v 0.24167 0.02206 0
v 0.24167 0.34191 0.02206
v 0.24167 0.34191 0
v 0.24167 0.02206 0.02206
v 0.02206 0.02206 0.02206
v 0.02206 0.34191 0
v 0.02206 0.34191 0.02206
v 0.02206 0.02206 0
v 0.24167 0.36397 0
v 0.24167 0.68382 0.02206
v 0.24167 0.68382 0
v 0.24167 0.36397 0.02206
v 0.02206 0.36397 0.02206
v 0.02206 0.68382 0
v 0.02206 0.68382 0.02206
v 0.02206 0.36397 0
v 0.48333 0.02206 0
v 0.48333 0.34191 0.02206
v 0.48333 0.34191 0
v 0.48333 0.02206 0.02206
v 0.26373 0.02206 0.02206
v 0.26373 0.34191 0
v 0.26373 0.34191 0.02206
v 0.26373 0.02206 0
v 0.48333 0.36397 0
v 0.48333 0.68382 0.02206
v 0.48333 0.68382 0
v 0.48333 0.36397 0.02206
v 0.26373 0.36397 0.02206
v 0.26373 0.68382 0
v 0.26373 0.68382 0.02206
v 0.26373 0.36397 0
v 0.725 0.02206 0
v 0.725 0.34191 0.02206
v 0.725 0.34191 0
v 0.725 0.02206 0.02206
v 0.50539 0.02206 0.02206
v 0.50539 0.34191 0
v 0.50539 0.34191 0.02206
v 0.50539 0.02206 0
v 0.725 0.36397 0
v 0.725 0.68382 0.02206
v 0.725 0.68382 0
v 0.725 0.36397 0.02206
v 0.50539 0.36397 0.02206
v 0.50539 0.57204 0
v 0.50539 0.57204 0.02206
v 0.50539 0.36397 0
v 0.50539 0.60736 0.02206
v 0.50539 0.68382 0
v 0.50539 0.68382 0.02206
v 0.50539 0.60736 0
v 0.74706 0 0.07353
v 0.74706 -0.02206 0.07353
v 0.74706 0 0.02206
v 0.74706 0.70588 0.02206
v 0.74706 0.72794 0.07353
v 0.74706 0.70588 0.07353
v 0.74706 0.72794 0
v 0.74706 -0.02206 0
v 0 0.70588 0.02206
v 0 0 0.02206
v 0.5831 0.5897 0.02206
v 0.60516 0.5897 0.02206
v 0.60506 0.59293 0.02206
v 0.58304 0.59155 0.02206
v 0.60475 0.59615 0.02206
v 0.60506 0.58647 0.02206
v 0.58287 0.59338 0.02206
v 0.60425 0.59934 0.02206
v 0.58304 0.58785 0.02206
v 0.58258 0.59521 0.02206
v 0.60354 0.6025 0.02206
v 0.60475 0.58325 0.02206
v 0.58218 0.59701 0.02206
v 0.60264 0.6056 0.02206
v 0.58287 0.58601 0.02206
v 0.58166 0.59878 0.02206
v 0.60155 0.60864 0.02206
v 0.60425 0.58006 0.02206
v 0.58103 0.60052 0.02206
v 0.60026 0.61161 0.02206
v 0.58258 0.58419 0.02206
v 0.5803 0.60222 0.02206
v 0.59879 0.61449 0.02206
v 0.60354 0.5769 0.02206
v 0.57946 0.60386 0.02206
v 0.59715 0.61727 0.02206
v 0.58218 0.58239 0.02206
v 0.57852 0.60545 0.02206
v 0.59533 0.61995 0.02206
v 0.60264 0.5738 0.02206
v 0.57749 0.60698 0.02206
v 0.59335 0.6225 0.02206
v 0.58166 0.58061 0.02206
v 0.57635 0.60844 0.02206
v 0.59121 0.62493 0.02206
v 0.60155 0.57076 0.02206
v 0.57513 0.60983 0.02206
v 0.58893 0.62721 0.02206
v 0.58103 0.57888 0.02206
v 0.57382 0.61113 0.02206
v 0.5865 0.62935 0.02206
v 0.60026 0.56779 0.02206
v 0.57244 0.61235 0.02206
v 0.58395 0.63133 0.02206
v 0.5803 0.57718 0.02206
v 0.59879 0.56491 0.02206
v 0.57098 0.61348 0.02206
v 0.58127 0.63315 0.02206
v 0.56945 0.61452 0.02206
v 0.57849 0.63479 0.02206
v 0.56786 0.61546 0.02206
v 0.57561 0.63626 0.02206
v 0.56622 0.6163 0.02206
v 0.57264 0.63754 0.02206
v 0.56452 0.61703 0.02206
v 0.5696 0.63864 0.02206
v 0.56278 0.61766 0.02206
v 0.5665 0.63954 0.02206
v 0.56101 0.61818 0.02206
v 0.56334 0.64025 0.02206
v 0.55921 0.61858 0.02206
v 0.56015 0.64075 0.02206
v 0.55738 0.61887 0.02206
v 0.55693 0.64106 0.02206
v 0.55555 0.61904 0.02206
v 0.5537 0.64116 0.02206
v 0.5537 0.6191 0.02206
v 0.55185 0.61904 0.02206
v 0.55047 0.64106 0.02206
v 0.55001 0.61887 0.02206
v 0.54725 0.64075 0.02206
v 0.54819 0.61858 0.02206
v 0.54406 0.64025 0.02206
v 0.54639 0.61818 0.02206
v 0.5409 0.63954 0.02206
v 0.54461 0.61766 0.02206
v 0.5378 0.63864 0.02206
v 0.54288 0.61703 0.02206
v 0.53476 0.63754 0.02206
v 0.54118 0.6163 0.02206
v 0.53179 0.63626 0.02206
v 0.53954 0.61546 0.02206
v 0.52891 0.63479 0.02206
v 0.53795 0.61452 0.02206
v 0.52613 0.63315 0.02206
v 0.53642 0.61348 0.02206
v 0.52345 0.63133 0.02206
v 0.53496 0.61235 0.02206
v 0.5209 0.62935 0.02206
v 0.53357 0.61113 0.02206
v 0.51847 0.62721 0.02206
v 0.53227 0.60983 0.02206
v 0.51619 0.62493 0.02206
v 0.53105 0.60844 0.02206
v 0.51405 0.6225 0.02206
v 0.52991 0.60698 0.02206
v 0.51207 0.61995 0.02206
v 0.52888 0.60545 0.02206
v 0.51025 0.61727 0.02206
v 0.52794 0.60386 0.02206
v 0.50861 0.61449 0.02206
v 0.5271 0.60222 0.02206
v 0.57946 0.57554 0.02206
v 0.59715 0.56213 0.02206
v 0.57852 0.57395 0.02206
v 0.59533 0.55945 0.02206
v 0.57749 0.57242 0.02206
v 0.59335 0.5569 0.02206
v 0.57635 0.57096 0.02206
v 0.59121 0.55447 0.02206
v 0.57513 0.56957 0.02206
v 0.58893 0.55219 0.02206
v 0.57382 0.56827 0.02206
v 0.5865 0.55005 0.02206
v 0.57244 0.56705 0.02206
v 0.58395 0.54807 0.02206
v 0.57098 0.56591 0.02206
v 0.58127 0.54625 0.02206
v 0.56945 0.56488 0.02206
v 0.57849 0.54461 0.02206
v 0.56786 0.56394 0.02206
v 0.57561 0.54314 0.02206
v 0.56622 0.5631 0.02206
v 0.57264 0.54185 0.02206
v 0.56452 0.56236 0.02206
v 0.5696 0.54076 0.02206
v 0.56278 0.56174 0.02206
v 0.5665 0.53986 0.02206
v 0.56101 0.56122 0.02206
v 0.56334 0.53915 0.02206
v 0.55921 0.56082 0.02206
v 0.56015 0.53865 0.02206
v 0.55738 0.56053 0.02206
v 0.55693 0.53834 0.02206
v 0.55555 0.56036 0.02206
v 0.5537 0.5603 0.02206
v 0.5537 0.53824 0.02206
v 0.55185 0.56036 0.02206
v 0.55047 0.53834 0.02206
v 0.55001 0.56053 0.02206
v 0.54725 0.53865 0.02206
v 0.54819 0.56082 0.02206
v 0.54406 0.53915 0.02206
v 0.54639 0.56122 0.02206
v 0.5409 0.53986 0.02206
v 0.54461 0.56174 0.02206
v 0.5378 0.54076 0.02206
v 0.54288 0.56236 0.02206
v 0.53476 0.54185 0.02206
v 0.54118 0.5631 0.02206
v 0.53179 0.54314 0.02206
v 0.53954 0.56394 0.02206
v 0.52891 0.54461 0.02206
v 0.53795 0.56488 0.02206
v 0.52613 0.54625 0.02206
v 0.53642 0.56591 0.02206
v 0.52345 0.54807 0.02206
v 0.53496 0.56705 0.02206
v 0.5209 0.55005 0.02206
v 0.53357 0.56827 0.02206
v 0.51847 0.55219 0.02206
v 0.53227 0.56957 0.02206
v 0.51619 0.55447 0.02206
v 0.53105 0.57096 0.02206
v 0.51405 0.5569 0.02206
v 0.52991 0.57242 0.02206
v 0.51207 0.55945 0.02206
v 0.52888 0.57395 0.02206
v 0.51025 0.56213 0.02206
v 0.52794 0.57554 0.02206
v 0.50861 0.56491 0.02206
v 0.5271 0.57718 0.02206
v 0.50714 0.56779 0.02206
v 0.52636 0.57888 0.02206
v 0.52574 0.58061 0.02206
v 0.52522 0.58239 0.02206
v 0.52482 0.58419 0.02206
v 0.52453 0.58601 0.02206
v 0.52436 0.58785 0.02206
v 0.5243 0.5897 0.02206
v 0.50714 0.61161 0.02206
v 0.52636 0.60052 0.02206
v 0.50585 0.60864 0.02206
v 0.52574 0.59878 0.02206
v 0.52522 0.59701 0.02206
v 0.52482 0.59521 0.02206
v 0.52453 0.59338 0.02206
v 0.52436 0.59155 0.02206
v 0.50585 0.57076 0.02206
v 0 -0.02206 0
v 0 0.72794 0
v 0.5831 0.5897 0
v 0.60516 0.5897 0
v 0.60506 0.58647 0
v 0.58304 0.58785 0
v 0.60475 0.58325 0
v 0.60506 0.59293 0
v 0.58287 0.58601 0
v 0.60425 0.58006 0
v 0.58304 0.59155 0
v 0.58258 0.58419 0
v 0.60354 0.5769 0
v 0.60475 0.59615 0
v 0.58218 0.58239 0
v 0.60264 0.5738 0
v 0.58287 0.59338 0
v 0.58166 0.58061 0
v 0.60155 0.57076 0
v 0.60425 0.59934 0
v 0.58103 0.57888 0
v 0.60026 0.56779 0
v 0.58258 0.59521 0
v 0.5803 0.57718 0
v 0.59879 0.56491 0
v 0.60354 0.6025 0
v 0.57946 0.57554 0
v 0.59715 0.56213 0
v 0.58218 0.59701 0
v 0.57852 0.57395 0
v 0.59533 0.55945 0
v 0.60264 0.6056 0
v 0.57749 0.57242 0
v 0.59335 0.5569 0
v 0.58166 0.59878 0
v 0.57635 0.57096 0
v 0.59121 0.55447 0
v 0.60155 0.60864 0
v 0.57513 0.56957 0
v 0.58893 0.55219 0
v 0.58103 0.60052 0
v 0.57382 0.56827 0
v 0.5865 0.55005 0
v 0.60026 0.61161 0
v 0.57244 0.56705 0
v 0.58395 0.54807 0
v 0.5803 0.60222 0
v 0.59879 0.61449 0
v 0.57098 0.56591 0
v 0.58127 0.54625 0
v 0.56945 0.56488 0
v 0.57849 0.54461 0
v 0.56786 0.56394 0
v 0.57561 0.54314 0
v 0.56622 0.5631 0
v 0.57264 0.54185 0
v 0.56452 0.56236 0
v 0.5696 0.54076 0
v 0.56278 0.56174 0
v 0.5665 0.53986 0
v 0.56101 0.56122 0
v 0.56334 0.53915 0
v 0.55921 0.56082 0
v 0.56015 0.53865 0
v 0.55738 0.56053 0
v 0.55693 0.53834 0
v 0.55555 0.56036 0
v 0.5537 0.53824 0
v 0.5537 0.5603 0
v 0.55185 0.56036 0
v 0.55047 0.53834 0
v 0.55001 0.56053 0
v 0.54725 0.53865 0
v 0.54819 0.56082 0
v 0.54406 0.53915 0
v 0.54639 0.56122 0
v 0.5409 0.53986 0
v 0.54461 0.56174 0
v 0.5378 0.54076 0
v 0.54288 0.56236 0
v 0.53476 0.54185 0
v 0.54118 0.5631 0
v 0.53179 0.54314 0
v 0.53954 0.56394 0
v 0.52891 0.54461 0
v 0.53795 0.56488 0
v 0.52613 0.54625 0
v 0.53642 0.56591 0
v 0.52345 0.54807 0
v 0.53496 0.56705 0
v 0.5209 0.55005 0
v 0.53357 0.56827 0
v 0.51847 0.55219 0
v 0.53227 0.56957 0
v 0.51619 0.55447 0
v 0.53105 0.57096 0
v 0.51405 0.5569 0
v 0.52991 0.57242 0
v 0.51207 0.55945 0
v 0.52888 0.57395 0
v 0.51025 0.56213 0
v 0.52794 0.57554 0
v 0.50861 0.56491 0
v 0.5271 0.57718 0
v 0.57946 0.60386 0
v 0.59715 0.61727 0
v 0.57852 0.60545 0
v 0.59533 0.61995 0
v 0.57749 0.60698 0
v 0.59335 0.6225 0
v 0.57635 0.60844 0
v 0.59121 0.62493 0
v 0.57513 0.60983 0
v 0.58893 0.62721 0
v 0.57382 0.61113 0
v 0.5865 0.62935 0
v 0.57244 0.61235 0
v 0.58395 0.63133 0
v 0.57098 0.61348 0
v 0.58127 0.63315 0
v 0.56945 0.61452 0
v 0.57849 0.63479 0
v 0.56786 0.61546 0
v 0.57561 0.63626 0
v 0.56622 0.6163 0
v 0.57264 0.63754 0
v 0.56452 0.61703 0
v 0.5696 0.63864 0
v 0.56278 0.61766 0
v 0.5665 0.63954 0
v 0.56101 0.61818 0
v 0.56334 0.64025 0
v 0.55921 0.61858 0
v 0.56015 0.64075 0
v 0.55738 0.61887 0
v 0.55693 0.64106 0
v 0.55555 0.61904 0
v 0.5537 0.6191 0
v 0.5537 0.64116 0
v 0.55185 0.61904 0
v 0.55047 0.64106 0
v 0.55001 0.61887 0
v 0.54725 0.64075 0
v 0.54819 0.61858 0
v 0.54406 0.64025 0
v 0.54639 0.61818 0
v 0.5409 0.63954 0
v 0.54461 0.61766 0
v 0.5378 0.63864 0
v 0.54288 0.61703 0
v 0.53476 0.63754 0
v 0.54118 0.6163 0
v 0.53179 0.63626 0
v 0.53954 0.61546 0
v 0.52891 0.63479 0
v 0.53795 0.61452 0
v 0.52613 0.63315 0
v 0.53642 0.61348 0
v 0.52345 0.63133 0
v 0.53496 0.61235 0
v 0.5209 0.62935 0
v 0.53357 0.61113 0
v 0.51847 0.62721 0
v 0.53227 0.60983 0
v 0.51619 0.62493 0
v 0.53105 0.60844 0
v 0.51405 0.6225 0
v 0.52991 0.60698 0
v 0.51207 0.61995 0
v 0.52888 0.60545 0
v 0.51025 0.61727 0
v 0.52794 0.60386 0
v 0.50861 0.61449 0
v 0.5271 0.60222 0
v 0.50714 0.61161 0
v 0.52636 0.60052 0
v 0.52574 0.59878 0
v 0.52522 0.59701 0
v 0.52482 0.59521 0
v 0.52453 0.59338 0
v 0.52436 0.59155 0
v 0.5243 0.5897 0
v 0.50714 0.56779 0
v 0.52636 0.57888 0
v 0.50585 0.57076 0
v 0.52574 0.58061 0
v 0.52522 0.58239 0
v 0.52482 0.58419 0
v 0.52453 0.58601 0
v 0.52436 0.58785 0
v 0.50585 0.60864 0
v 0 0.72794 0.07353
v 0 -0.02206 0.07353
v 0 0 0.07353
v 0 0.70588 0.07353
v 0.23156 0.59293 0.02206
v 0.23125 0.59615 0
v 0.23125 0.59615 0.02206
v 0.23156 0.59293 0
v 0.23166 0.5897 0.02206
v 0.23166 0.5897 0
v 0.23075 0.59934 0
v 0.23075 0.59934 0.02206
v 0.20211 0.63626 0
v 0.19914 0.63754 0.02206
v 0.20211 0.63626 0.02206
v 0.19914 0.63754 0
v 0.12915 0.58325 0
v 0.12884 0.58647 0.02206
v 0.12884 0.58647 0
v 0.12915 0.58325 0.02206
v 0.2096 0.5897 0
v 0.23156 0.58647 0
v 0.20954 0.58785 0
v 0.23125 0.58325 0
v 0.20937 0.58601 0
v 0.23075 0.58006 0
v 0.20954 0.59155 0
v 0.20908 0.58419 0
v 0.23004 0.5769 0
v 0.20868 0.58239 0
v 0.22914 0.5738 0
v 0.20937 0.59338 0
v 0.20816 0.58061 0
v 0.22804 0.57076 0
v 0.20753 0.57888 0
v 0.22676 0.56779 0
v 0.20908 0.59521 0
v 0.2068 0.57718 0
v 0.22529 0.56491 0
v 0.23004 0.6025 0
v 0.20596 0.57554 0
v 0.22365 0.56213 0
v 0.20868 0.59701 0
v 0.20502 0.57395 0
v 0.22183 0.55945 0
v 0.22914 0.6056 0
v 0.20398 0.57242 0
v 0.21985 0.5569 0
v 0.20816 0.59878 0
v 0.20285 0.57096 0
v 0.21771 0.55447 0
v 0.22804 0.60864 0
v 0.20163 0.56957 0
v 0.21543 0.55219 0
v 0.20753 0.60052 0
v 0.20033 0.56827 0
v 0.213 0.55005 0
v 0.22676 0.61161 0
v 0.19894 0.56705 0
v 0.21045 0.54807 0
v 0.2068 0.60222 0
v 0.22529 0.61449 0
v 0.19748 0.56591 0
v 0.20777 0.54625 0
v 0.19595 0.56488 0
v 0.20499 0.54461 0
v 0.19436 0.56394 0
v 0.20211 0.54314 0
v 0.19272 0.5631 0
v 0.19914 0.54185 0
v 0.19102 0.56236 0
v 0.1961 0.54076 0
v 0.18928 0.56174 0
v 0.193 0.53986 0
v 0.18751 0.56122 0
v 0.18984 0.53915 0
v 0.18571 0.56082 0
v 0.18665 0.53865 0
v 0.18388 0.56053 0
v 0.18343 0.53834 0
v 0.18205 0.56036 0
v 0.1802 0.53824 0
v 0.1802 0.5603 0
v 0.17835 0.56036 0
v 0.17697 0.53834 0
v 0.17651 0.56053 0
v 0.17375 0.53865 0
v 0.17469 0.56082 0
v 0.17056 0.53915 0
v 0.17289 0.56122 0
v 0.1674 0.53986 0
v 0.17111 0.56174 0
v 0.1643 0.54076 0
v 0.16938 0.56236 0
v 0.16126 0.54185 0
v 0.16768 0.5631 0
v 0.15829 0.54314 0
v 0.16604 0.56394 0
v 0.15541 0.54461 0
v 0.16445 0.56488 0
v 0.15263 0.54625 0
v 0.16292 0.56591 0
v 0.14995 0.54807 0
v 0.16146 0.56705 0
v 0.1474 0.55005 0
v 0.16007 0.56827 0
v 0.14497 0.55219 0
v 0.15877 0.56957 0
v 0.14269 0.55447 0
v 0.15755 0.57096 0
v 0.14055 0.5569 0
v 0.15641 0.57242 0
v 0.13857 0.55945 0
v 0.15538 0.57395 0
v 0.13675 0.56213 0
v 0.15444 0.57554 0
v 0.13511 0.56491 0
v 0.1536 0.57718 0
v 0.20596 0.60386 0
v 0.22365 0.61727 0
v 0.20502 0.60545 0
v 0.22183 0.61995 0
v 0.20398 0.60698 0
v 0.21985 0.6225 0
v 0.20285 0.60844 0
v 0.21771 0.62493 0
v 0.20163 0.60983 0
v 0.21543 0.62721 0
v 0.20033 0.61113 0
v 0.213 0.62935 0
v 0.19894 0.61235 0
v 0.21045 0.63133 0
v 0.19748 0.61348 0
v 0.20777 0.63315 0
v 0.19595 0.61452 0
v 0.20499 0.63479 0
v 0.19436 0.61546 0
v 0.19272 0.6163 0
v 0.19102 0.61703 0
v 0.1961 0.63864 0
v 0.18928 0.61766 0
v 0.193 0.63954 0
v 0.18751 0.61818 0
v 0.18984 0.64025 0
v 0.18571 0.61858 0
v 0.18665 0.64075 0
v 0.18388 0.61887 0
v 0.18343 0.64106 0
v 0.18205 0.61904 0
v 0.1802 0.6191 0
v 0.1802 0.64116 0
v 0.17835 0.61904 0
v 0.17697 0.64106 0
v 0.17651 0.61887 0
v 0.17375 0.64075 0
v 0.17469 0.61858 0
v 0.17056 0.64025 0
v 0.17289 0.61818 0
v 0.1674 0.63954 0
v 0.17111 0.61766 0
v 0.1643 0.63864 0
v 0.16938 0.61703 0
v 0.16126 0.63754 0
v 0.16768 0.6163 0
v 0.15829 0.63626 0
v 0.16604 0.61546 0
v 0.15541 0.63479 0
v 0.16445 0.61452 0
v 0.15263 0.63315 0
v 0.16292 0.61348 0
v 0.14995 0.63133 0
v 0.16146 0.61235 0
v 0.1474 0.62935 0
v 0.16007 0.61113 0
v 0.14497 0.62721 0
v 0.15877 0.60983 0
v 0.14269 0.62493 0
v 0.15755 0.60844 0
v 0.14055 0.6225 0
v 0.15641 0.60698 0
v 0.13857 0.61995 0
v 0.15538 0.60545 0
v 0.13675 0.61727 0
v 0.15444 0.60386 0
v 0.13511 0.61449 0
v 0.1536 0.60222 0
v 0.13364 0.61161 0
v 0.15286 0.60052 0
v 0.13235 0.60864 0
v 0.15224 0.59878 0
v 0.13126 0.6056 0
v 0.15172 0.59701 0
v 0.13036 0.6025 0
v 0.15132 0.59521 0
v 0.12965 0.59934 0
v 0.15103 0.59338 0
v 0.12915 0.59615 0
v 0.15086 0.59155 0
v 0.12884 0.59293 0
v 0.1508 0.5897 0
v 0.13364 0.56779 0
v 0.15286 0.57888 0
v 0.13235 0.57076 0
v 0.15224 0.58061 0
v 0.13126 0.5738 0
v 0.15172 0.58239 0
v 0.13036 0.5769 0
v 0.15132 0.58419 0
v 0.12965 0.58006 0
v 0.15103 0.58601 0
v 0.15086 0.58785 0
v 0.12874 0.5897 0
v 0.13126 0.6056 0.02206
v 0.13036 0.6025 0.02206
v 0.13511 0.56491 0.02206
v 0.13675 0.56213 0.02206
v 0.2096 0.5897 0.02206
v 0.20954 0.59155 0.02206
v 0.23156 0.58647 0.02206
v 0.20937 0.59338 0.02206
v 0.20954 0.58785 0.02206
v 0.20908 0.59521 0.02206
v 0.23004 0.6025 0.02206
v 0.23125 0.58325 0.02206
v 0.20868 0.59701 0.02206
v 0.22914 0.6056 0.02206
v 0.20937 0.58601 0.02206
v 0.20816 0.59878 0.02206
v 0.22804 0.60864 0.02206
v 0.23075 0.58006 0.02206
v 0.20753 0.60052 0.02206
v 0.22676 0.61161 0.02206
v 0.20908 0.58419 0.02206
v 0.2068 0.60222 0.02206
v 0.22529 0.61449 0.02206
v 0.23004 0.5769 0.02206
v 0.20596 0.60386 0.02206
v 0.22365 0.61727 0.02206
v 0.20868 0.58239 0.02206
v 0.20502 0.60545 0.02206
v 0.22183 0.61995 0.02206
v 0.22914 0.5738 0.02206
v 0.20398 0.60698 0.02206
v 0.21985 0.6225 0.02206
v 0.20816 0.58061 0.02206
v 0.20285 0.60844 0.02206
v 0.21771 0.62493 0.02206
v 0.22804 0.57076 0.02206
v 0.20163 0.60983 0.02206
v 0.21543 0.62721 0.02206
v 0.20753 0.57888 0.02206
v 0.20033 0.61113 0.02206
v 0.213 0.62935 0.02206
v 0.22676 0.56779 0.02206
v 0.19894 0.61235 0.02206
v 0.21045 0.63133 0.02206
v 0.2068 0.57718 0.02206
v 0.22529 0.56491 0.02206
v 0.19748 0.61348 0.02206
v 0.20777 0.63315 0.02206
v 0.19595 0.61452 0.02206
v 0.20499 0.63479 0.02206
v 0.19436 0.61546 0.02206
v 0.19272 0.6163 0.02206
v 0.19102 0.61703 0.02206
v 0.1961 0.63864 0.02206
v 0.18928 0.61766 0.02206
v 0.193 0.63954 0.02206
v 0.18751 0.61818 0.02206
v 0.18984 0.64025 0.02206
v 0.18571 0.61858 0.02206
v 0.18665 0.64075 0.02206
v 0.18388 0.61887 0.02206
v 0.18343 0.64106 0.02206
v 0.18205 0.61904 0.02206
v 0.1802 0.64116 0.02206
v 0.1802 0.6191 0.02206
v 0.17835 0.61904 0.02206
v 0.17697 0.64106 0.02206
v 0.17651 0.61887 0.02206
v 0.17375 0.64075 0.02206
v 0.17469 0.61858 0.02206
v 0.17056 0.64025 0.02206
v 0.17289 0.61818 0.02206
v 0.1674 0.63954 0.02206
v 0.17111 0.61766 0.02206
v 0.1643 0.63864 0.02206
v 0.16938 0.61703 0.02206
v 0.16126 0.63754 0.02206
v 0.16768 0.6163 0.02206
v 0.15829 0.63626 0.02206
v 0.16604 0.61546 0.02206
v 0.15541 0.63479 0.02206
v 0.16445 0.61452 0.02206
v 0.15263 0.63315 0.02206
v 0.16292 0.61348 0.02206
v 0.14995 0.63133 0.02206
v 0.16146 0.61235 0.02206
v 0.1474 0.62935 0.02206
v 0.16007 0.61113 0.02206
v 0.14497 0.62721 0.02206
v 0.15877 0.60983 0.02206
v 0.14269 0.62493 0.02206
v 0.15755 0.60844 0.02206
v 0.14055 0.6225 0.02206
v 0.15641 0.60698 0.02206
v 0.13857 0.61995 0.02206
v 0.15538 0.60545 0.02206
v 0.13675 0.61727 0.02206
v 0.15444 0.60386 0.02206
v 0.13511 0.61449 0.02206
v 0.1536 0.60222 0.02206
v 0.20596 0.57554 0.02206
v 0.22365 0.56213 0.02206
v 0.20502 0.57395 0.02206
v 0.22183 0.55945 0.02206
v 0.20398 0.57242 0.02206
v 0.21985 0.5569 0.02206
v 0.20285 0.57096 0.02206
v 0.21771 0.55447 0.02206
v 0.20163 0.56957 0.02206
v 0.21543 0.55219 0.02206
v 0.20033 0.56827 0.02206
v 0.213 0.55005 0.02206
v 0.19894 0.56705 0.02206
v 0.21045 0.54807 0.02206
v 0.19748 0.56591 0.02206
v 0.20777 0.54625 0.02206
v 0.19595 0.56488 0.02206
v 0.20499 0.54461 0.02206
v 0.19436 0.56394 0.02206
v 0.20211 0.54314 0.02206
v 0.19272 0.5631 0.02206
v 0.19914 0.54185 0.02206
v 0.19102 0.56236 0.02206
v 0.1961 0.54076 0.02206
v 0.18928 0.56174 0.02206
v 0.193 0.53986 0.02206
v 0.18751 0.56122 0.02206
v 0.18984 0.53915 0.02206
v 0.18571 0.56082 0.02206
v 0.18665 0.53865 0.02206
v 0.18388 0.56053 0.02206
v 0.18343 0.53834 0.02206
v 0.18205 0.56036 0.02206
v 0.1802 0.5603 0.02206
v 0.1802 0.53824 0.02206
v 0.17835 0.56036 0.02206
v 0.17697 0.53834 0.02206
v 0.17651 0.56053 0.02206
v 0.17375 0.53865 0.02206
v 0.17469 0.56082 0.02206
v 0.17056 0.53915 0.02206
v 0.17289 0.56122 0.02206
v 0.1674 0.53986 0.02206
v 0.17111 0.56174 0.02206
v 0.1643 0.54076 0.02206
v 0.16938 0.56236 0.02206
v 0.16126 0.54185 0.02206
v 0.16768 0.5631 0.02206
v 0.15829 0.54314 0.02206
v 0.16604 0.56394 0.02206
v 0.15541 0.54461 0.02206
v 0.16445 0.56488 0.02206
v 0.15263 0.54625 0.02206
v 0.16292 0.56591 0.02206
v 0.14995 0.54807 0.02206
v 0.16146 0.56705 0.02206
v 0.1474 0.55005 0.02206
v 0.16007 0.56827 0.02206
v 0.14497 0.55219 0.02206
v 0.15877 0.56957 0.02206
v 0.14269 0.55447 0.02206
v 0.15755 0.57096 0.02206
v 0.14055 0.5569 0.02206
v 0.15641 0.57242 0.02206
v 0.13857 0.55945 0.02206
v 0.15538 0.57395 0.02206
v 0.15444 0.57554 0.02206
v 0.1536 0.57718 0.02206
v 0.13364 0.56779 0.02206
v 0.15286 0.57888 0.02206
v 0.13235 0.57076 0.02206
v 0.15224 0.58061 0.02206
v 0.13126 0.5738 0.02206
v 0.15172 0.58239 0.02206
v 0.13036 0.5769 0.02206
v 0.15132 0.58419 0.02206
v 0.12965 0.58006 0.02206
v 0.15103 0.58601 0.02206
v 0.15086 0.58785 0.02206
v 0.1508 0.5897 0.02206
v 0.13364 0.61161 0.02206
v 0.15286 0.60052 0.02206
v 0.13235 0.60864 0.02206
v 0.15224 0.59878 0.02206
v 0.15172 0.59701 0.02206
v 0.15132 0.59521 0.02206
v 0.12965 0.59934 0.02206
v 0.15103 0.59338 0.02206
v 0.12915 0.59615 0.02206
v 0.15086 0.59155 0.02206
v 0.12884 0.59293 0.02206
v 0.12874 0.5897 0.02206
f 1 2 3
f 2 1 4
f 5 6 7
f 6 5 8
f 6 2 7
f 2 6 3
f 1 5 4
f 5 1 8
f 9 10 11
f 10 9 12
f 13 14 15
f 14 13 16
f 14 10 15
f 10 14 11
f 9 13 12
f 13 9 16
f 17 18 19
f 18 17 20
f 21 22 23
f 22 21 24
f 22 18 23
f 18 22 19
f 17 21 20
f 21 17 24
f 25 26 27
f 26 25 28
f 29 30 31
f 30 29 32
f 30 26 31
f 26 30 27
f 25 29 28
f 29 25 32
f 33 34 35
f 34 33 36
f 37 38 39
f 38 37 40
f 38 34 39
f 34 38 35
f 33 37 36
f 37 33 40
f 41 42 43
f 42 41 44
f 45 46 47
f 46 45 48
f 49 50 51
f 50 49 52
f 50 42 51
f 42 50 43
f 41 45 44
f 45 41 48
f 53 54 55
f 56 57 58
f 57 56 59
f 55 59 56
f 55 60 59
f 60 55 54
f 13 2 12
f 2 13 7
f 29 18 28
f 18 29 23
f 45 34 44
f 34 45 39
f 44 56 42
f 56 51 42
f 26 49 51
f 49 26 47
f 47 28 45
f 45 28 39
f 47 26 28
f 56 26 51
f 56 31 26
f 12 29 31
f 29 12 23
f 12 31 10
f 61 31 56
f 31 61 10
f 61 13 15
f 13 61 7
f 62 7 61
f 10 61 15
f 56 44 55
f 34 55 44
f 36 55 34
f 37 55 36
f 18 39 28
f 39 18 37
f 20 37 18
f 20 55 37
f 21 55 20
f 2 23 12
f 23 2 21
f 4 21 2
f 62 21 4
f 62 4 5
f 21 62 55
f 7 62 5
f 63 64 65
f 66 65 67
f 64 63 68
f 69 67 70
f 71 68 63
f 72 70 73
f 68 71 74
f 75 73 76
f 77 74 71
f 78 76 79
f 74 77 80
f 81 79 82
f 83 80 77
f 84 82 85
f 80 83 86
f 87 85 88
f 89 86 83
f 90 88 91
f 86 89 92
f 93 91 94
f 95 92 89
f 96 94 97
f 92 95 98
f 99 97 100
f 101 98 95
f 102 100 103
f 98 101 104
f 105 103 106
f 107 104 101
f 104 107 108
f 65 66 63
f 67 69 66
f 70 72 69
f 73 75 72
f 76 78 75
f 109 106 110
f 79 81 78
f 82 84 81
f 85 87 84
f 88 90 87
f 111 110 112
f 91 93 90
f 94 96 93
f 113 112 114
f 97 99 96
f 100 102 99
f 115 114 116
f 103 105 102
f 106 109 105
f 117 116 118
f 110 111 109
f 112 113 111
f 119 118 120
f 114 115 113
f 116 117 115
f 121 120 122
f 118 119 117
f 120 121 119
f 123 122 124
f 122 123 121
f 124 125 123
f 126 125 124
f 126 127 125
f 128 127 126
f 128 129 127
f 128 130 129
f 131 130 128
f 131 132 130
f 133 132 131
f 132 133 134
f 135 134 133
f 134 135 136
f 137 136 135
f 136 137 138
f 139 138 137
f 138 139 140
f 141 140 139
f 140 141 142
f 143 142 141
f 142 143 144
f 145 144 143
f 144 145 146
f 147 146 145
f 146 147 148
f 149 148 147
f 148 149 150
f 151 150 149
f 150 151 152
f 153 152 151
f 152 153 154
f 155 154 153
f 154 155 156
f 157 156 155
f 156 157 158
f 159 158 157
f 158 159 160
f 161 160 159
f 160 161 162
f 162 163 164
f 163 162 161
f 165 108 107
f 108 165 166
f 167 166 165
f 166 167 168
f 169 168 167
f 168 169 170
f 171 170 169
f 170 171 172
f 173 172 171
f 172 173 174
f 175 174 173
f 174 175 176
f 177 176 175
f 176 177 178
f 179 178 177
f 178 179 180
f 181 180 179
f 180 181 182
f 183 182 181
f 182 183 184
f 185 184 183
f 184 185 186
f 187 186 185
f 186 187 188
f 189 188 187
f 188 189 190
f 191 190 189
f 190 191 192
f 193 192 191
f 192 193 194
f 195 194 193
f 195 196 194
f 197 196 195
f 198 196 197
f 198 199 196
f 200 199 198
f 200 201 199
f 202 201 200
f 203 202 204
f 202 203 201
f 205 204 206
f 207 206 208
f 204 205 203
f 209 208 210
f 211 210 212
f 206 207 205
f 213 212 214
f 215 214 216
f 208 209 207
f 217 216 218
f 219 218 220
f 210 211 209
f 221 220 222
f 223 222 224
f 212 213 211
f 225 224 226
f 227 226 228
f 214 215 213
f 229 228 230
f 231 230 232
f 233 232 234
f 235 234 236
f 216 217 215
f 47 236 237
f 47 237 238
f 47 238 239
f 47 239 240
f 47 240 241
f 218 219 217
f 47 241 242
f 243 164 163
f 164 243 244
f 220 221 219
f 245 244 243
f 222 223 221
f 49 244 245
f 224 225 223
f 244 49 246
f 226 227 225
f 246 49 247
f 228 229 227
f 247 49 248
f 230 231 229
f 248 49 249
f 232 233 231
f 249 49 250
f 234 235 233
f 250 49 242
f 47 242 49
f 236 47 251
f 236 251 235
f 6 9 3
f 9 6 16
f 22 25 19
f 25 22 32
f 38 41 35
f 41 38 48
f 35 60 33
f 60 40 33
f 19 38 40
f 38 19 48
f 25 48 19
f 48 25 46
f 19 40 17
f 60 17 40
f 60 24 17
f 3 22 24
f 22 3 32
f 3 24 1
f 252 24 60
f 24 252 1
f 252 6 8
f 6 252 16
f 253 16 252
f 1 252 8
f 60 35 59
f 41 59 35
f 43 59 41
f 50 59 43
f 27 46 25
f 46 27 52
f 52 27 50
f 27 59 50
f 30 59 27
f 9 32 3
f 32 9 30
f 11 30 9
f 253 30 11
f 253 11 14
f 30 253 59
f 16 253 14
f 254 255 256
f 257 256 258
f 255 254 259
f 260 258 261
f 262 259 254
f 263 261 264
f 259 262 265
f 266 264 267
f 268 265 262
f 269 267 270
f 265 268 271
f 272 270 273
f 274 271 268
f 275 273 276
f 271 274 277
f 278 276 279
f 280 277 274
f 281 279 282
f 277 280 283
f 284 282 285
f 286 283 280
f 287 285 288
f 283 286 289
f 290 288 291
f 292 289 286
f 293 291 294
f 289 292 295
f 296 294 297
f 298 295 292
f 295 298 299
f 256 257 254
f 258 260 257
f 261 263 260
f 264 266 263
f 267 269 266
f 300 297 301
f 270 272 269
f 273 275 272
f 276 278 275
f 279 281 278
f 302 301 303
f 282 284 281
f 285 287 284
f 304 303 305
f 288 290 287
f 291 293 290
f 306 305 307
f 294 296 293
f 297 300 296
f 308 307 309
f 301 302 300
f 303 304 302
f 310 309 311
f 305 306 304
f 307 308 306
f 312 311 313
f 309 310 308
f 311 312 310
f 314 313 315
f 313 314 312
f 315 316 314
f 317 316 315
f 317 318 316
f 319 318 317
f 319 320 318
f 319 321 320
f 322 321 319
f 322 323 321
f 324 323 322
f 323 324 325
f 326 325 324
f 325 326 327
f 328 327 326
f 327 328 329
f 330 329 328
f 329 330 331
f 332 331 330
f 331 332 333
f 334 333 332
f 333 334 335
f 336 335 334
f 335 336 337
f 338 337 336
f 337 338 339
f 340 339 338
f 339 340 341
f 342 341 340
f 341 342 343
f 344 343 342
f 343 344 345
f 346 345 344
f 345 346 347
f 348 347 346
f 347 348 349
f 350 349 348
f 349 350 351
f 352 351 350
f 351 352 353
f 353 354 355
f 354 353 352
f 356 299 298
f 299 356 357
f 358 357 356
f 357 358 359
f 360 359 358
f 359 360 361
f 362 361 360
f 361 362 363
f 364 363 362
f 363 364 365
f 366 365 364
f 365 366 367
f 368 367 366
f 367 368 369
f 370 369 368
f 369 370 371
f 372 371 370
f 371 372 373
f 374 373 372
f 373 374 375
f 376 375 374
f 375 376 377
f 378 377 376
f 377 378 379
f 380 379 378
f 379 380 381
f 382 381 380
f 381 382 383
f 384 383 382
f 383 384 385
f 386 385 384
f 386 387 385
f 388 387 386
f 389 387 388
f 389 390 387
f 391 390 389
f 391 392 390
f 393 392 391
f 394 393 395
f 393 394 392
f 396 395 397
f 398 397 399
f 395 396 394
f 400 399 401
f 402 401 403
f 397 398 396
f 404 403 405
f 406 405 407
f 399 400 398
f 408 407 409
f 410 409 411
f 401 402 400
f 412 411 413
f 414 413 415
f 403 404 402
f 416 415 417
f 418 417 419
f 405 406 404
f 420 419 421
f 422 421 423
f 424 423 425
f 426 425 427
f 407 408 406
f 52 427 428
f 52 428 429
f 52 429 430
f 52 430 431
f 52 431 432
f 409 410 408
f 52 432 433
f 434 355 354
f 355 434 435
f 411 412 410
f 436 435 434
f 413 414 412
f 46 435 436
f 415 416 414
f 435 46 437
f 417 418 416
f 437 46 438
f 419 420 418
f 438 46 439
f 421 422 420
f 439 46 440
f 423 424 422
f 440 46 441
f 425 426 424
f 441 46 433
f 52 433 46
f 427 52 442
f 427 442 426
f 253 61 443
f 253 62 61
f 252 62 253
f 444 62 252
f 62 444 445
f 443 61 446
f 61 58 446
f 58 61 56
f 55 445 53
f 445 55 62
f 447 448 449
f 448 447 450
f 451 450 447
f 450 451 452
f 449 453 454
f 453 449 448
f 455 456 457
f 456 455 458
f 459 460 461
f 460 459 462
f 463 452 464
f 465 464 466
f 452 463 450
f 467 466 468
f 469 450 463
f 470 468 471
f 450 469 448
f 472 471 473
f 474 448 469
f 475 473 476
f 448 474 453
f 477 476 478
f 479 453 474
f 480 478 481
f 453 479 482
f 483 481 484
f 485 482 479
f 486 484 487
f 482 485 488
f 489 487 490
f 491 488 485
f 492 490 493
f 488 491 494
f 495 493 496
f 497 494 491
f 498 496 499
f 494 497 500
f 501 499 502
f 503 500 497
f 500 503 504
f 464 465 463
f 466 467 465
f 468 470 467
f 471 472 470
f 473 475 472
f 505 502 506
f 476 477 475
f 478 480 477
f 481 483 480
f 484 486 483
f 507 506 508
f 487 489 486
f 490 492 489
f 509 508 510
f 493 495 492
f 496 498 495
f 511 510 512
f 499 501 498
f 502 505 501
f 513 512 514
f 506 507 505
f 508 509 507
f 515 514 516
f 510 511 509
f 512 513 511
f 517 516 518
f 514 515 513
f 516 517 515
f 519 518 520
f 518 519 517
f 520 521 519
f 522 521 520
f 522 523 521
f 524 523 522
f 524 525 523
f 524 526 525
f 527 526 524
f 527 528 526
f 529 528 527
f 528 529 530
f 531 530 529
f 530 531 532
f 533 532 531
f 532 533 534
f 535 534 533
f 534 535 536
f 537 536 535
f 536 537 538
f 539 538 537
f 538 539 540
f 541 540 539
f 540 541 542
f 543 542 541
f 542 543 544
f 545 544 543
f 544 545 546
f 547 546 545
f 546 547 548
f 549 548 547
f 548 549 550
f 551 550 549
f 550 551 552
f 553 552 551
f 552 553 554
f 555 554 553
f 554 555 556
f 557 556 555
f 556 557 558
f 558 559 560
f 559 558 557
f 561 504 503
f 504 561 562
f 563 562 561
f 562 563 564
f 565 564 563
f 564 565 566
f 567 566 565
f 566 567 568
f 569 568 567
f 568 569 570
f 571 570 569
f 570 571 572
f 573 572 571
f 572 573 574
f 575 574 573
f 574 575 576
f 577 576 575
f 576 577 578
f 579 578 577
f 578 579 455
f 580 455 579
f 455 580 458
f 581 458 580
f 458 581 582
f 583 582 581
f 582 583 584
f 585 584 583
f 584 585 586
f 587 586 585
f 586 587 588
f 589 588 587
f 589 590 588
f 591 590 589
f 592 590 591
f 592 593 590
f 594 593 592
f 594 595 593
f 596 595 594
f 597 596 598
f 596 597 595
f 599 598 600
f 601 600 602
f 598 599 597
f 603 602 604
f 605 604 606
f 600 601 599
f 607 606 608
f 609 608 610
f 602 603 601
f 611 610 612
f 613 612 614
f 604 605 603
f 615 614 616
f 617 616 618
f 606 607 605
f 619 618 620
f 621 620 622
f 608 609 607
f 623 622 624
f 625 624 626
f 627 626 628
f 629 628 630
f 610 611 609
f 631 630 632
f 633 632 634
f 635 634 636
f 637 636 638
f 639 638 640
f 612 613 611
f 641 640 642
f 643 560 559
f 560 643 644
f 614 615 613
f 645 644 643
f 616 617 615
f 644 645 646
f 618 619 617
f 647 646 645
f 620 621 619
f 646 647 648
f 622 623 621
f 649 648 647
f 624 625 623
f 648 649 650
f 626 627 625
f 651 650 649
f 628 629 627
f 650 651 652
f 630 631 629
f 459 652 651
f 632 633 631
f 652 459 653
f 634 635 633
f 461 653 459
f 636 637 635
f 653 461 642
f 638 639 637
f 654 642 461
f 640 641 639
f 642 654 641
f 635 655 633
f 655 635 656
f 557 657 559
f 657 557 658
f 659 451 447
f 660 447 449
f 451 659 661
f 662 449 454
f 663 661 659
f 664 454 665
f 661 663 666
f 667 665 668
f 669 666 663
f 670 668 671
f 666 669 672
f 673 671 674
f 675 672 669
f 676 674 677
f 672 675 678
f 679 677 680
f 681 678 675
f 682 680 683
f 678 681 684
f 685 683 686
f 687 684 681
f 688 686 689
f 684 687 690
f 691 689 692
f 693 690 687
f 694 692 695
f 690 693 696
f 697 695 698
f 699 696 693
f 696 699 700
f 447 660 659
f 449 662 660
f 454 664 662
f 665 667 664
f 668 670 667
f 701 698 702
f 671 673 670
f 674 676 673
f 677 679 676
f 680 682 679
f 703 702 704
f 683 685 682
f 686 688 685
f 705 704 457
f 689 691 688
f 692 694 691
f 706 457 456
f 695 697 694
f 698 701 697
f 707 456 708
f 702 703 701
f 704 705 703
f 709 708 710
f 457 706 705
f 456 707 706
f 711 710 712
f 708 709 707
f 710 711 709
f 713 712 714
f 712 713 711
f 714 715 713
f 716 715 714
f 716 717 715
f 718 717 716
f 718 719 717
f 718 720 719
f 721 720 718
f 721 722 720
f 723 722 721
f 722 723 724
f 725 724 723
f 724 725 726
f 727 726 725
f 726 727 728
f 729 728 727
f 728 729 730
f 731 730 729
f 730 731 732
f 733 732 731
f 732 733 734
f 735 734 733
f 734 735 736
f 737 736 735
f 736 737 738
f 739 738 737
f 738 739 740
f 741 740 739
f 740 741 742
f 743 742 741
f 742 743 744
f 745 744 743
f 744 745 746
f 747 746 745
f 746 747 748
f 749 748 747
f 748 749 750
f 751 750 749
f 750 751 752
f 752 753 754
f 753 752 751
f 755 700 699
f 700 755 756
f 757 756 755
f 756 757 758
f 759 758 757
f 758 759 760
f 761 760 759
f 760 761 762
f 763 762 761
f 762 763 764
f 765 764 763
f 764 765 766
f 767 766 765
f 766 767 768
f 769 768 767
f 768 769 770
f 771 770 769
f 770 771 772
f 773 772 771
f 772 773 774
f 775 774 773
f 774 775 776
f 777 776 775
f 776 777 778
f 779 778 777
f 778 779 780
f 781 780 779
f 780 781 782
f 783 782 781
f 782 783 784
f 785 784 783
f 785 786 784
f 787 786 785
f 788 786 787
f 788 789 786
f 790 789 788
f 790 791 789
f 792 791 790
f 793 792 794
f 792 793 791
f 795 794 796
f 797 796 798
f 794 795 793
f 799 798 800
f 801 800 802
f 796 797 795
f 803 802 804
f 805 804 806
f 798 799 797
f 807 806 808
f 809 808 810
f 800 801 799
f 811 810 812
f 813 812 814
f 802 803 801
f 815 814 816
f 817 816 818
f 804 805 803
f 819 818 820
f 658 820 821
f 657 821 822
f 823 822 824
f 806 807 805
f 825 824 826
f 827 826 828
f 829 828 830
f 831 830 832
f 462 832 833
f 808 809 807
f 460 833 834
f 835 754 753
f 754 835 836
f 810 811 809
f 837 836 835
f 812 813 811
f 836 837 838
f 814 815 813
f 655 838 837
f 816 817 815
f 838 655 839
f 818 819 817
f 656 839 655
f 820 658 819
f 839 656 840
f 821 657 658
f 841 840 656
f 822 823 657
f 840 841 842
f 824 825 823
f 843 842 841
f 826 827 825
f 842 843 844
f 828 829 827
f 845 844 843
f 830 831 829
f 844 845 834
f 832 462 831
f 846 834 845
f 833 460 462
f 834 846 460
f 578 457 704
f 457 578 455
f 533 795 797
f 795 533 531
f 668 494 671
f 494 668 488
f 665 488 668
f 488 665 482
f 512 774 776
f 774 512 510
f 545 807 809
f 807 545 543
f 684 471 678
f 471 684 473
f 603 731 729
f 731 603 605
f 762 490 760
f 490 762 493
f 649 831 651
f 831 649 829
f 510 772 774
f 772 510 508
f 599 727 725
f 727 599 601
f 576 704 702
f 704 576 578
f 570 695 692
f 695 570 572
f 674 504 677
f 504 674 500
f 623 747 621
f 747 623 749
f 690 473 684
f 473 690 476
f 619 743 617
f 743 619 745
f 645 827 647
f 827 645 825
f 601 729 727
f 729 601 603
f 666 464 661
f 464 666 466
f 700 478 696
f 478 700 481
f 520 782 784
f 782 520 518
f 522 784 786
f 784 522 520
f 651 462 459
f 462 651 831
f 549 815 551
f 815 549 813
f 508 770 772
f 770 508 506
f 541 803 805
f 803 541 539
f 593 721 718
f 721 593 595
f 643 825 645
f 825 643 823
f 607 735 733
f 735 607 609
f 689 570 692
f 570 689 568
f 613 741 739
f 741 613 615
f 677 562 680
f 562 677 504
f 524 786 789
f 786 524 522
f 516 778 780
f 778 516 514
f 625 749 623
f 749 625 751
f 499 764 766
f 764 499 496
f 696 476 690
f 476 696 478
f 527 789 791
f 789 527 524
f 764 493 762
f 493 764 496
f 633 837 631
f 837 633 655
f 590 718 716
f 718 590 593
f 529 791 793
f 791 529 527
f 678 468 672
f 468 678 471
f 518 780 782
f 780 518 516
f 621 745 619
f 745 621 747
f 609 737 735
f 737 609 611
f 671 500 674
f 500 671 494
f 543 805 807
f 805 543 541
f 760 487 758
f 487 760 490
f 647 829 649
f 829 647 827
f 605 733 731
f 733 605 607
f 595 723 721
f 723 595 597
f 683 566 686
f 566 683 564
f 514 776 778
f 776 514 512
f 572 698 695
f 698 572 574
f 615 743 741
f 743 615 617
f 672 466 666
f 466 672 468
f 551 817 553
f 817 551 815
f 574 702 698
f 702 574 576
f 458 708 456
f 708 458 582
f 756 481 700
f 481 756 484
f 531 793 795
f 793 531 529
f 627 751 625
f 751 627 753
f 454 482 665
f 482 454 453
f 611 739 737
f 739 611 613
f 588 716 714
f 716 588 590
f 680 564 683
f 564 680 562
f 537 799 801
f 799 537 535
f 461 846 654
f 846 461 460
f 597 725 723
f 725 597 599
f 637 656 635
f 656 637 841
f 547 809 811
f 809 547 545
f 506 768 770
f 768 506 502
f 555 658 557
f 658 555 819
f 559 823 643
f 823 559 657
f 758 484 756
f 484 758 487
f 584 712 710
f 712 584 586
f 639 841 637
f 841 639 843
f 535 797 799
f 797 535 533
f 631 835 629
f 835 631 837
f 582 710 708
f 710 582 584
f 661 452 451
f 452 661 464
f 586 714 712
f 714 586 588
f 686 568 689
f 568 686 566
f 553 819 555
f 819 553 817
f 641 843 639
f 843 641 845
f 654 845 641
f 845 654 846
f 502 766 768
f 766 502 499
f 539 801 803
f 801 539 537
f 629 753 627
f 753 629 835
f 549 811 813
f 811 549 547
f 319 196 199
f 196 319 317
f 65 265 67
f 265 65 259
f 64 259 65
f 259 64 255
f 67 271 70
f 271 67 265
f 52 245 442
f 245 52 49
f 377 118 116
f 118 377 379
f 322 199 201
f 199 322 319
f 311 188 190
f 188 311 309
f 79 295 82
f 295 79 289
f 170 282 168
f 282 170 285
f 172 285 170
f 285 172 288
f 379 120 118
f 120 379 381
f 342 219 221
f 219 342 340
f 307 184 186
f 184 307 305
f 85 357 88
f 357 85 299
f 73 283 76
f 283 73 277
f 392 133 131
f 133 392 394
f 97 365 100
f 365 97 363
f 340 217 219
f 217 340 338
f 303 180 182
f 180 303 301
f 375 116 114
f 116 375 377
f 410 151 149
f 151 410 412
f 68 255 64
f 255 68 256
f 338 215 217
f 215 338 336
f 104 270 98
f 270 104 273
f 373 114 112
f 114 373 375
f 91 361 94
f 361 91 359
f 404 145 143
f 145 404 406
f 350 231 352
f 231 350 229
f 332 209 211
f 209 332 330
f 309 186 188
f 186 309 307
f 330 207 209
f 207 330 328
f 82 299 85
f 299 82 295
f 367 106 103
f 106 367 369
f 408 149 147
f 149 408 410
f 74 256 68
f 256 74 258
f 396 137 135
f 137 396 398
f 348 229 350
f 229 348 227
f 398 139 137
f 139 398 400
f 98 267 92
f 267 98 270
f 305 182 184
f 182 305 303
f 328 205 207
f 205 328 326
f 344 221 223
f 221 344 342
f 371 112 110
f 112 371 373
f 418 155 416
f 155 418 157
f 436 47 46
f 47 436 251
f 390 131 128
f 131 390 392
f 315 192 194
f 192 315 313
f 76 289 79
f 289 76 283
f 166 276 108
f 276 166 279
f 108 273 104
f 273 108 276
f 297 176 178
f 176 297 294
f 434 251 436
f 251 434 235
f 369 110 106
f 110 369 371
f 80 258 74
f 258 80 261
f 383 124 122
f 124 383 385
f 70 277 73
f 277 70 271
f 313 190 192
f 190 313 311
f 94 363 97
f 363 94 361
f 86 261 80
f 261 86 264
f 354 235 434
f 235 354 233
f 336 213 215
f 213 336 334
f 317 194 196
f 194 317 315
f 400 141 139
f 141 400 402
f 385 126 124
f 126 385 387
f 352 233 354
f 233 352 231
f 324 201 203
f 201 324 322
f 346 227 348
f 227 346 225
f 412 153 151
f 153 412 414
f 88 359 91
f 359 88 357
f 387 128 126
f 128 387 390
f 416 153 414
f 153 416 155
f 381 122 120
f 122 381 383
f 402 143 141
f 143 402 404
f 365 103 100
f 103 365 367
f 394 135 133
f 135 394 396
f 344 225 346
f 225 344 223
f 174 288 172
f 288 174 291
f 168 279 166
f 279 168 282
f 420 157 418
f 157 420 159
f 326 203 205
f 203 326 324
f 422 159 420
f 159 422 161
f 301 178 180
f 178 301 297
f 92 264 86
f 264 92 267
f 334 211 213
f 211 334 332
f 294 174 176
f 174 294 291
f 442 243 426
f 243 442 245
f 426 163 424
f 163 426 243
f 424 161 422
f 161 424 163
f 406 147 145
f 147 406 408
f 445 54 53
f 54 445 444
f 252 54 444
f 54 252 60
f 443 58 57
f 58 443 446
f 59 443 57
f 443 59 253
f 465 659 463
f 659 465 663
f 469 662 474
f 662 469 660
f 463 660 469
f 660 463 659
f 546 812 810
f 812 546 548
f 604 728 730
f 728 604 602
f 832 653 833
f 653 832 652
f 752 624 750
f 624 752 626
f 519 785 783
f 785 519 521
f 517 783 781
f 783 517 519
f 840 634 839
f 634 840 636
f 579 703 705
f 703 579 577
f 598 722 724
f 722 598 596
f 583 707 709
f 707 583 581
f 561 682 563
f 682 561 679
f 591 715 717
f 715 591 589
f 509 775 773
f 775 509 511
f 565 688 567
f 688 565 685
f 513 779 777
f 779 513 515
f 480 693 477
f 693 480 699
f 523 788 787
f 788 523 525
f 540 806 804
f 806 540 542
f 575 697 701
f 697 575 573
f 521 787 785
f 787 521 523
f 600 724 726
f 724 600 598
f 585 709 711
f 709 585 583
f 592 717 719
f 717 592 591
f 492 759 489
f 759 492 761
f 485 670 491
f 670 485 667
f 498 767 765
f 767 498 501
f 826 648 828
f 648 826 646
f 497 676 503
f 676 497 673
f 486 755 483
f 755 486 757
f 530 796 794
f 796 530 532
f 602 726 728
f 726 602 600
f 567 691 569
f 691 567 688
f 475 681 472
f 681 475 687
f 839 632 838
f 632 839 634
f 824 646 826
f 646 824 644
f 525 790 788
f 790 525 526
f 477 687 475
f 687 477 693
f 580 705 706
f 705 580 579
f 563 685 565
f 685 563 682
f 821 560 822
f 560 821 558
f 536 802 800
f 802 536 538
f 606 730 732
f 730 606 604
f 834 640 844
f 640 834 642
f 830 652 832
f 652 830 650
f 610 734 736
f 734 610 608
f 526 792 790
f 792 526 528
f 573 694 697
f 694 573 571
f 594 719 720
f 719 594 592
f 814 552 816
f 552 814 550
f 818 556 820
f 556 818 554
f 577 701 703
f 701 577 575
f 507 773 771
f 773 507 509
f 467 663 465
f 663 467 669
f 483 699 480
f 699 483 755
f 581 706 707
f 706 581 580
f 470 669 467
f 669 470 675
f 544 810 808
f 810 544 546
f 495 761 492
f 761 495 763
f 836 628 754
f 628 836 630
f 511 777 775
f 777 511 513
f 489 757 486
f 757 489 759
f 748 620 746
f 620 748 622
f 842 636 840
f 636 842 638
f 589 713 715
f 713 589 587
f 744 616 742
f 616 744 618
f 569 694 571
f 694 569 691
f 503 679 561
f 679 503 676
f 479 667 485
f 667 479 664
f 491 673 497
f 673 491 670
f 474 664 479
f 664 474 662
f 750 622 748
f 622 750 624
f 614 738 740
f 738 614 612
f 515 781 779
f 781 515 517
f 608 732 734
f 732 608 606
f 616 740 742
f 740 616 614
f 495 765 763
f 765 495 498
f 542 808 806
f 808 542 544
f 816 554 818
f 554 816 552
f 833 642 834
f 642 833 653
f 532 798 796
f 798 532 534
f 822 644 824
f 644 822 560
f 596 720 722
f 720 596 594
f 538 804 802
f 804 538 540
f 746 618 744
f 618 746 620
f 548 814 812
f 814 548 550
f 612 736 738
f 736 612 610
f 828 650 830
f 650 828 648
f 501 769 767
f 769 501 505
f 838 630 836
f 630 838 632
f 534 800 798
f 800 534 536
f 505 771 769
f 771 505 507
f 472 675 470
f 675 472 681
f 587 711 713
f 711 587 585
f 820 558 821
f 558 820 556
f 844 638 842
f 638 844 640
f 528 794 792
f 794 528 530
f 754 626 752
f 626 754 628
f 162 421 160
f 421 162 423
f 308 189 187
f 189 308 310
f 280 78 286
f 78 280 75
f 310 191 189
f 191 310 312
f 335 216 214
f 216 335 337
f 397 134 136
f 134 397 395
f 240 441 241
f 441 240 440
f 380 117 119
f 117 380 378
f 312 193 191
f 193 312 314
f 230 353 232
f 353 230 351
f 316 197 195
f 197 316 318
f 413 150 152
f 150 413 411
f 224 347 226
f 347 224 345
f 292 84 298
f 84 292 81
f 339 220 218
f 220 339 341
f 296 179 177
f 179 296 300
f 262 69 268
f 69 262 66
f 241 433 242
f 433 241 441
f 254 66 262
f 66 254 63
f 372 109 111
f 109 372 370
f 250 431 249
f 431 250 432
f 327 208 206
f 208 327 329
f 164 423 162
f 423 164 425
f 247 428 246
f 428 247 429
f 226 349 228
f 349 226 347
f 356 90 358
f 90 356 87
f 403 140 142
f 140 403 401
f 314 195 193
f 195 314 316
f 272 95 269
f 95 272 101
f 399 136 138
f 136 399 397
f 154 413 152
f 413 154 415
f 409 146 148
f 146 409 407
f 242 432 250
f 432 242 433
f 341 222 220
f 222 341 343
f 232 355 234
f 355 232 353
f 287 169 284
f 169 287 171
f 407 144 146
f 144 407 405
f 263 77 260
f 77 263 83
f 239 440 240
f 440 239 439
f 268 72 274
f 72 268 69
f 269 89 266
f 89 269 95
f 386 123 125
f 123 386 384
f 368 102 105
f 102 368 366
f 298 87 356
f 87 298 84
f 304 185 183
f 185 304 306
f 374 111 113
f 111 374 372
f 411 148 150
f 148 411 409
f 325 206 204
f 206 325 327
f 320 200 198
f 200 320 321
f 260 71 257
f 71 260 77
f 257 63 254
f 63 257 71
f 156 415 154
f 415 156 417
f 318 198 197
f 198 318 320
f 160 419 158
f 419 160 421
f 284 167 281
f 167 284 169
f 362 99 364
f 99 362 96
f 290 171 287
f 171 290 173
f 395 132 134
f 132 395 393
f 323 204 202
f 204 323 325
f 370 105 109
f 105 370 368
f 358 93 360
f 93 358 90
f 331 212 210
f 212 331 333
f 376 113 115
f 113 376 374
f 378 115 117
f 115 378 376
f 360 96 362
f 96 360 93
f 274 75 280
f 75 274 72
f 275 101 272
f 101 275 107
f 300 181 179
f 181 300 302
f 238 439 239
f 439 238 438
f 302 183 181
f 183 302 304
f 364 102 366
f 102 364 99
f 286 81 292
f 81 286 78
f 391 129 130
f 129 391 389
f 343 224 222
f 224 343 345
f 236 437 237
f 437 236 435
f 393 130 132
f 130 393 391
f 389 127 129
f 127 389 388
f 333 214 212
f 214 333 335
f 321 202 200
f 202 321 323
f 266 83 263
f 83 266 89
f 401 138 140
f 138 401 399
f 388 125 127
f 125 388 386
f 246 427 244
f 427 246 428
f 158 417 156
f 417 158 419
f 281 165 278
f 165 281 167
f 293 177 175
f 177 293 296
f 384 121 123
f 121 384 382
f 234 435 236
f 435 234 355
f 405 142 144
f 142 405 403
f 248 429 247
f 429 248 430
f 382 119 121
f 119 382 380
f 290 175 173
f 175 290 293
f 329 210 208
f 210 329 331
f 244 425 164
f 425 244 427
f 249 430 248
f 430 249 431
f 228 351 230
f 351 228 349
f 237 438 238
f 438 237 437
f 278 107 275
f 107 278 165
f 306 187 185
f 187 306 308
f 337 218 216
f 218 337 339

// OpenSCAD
// ==========================================
// Parametric CAD Model
// ==========================================

// Resolution for circular features
$fn = 100;

// Base Dimensions
base_length = 0.747059;
base_width = 0.705882;
base_thickness = 0.022059;

// Wall and Rib Dimensions
wall_thickness = 0.022059;
wall_height = 0.073529;

// Circular Openings (Holes)
hole_radius = 0.0294;
hole1_x = 0.1802;
hole1_y = 0.5897;
hole2_x = 0.5537;
hole2_y = 0.5897;

// Epsilon for clean boolean operations
eps = 0.002;

// ==========================================
// Module Definitions
// ==========================================

// Module for the main solid structure before hole subtraction
module solid_structure() {
    union() {
        // 1. Base Web Structure
        difference() {
            // Main solid base footprint
            cube([base_length, base_width, base_thickness]);
            
            // Subtract 6 inner void outlines to create the open web
            // Arranged in a 3x2 grid (3 columns in X, 2 rows in Y)
            let(
                void_w = (base_length - 4 * wall_thickness) / 3,
                void_d = (base_width - 3 * wall_thickness) / 2
            ) {
                for (i = [0:2]) {
                    for (j = [0:1]) {
                        translate([
                            wall_thickness + i * (void_w + wall_thickness),
                            wall_thickness + j * (void_d + wall_thickness),
                            -eps/2
                        ])
                        cube([void_w, void_d, base_thickness + eps]);
                    }
                }
            }
        }
        
        // 2. Bosses for the circular openings
        // Ensures material exists around the holes within the open web
        let(boss_radius = hole_radius + wall_thickness) {
            translate([hole1_x, hole1_y, 0])
                cylinder(h=base_thickness, r=boss_radius);
            
            translate([hole2_x, hole2_y, 0])
                cylinder(h=base_thickness, r=boss_radius);
        }
        
        // 3. Front Side Wall
        // Positioned at front offset -0.0221 (using wall_thickness)
        translate([0, -wall_thickness, 0])
            cube([base_length, wall_thickness, wall_height]);
            
        // 4. Back Side Wall
        // Positioned at back offset 0.7058 (starts at base_width)
        translate([0, base_width, 0])
            cube([base_length, wall_thickness, wall_height]);
    }
}

// ==========================================
// Main Model Assembly
// ==========================================

difference() {
    // Start with the full solid structure (web, bosses, and side walls)
    solid_structure();
    
    // Subtract the two circular through openings
    // Hole 1
    translate([hole1_x, hole1_y, -eps/2])
        cylinder(h=base_thickness + eps, r=hole_radius);
        
    // Hole 2
    translate([hole2_x, hole2_y, -eps/2])
        cylinder(h=base_thickness + eps, r=hole_radius);
}
